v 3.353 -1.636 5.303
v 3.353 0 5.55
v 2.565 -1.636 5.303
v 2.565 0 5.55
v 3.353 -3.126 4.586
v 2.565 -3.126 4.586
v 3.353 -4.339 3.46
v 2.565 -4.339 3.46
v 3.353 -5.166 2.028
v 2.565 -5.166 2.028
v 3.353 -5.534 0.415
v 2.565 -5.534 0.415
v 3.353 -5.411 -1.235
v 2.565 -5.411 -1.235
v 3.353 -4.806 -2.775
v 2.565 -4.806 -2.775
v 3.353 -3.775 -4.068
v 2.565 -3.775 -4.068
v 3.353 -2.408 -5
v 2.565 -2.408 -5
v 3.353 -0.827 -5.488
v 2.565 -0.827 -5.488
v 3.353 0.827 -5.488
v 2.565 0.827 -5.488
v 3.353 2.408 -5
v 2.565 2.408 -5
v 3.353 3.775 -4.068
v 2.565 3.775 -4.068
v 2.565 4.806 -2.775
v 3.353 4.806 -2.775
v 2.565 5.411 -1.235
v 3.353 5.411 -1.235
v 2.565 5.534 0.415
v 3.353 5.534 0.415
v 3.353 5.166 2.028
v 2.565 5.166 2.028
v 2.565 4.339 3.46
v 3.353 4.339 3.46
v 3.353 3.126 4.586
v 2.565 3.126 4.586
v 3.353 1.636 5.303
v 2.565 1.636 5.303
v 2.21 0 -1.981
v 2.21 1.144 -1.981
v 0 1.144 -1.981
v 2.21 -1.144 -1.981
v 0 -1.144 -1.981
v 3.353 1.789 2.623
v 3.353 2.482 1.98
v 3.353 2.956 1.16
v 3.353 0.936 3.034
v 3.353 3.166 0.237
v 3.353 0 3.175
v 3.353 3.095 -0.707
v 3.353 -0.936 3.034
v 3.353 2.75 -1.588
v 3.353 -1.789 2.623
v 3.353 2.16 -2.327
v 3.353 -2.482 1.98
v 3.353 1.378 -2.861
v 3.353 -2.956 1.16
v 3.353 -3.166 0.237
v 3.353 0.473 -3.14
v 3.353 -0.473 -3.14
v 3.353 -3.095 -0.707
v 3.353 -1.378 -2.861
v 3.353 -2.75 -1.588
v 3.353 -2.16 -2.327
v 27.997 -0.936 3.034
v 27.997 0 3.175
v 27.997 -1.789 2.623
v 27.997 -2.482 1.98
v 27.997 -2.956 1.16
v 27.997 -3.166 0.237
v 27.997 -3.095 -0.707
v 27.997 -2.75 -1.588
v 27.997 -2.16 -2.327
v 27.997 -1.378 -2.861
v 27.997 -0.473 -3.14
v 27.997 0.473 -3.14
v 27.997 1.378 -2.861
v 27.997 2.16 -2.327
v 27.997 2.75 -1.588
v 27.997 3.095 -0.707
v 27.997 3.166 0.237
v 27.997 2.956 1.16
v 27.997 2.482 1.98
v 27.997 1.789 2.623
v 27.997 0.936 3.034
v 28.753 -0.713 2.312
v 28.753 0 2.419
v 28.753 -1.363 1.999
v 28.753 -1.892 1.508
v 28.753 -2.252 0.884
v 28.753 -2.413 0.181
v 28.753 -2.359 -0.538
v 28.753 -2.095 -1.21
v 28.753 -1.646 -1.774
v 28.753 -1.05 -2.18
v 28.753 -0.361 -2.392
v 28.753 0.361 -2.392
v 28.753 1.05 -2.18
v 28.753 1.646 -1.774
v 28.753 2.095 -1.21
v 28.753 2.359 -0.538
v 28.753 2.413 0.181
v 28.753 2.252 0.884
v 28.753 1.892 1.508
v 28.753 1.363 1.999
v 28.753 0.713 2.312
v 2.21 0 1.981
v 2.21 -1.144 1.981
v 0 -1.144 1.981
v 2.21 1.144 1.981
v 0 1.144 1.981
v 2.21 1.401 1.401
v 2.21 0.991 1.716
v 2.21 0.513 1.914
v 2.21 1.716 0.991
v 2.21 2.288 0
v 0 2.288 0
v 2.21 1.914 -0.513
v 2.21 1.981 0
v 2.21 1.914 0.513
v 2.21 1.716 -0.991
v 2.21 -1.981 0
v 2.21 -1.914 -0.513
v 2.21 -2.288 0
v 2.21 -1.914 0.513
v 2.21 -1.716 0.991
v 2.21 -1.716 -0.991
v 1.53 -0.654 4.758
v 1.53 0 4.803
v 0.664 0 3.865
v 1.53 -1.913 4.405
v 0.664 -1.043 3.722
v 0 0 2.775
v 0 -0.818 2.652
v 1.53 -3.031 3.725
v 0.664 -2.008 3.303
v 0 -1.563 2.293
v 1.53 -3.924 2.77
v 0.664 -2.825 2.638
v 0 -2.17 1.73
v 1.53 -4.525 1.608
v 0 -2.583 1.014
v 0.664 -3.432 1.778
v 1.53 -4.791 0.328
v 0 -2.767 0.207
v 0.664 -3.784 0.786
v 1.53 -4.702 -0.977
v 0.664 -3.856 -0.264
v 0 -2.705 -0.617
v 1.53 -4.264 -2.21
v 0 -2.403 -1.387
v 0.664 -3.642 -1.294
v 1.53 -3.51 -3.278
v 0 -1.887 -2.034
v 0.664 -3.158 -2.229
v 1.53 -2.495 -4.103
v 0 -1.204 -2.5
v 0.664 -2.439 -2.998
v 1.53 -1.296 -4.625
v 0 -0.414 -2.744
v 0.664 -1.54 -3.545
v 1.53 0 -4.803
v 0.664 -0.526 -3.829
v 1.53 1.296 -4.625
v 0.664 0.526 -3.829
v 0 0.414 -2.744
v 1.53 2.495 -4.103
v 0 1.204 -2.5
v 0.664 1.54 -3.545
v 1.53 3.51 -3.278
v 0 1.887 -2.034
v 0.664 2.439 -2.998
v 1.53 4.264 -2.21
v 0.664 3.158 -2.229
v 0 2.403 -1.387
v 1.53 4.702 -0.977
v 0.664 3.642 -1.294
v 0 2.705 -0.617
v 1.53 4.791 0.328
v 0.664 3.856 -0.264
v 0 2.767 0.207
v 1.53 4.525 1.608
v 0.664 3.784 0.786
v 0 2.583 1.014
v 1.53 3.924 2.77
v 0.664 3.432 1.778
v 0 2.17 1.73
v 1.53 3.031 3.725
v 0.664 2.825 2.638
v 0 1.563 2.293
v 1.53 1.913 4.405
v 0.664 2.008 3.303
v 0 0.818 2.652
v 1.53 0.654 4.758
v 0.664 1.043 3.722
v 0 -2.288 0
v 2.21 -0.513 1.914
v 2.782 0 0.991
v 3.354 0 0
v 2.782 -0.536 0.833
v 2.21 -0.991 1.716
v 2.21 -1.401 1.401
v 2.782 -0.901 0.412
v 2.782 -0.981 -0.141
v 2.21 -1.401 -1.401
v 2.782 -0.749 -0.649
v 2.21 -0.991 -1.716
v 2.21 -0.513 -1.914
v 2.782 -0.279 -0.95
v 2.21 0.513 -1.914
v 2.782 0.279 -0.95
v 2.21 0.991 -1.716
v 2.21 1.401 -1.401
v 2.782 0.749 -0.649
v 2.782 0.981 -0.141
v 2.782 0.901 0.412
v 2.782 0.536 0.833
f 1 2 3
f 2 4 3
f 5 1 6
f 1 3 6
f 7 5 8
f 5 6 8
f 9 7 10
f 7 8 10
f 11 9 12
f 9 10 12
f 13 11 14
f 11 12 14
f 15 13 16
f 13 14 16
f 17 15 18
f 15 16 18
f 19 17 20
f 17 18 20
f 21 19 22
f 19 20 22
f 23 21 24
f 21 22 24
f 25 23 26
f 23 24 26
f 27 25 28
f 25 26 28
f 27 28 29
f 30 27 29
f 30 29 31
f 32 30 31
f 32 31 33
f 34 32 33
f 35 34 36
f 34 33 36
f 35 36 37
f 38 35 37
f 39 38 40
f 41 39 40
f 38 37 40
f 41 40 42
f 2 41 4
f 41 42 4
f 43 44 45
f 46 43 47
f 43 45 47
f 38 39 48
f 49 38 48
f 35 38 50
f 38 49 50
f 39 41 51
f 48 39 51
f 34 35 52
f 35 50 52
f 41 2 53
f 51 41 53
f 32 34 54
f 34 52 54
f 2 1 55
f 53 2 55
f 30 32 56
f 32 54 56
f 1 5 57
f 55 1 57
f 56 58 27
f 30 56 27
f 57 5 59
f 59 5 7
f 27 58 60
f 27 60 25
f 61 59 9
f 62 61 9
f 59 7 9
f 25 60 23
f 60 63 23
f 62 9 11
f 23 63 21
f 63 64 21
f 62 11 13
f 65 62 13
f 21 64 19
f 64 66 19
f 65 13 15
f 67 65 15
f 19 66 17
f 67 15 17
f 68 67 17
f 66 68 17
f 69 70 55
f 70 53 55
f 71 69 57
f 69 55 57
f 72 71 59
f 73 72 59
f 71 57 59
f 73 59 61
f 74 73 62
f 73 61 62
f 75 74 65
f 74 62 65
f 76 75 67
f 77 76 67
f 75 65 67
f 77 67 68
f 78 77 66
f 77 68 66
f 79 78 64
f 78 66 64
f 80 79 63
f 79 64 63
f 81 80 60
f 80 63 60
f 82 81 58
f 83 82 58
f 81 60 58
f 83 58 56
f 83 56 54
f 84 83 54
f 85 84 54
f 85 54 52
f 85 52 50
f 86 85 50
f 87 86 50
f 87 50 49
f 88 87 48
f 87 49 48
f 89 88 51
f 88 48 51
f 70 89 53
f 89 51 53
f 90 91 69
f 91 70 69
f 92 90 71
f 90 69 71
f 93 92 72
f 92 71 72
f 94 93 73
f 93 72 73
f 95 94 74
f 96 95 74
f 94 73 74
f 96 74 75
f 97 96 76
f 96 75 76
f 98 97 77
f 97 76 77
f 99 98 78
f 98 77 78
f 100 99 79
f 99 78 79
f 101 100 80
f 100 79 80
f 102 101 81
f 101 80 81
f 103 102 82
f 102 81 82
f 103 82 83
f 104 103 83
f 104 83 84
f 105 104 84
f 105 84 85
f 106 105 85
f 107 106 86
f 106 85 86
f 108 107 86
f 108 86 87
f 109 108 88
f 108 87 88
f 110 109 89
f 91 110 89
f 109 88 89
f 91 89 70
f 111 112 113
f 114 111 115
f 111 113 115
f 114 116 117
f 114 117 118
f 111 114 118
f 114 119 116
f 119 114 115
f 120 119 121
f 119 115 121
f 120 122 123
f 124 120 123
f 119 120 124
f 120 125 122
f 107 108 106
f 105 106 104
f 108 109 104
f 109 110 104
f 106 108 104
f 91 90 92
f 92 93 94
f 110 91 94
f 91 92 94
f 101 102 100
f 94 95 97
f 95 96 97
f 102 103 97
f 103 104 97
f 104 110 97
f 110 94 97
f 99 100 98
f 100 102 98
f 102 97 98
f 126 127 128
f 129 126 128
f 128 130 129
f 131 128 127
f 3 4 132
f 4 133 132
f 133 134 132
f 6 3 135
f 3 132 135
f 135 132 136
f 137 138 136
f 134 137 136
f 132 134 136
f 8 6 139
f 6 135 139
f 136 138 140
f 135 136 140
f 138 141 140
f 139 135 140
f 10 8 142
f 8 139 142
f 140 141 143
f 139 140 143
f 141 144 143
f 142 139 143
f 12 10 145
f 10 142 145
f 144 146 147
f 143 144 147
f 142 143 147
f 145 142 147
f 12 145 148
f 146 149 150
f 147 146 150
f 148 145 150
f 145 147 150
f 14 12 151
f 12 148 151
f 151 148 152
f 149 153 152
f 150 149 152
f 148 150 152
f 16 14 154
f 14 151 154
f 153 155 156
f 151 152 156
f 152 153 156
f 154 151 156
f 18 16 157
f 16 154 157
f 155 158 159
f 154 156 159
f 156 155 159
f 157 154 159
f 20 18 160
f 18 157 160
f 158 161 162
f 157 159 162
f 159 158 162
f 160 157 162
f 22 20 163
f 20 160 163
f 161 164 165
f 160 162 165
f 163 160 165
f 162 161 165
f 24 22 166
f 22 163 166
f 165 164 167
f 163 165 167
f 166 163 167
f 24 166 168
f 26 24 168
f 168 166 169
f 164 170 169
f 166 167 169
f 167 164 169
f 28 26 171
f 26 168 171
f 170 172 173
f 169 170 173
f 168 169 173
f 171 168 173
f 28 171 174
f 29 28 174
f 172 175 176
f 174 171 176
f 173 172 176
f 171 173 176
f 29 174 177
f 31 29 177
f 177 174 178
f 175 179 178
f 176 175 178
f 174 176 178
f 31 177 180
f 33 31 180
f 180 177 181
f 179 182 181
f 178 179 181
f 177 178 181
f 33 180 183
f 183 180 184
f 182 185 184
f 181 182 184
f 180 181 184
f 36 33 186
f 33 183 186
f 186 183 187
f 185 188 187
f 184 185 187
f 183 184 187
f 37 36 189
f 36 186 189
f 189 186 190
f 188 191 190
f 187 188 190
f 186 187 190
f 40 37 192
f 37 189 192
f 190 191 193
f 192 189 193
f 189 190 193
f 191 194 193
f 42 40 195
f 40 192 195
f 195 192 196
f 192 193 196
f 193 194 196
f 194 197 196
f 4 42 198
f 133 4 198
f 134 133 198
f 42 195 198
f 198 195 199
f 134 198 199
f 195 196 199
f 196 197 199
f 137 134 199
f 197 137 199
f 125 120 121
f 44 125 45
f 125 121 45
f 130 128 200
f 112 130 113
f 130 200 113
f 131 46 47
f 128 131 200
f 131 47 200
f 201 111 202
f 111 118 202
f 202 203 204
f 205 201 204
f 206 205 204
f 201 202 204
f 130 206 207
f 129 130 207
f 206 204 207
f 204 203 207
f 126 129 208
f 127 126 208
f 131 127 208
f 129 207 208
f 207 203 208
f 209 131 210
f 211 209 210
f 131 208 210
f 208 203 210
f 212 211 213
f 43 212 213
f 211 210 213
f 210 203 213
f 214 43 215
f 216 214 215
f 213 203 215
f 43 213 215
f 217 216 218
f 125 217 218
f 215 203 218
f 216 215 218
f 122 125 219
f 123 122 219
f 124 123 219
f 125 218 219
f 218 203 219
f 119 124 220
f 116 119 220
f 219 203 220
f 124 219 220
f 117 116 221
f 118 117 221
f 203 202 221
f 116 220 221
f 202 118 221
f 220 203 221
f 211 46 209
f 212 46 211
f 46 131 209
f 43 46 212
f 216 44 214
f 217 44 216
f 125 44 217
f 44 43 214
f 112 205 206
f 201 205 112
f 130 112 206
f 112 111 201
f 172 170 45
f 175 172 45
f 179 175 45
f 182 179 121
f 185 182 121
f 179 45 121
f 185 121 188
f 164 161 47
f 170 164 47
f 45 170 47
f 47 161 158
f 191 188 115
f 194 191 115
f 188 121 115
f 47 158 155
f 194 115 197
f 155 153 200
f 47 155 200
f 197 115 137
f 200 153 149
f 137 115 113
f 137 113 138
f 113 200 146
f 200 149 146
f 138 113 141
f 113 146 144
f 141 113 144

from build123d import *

# Parameters (mm, degrees)
HEX_2_DEPTH = 2.2098


with BuildPart() as part:
    # BodySke → BaseBody (revolve)
    with BuildSketch(Plane.XY, mode=Mode.PRIVATE) as basebody_sk:
        with BuildLine():
            Line((28.7528, 0), (28.7528, 2.41935))
            Line((28.7528, 2.41935), (27.99715, 3.175))
            Line((27.99715, 3.175), (3.3528, 3.175))
            Line((3.3528, 3.175), (3.3528, 5.5499))
            Line((3.3528, 5.5499), (2.5654, 5.5499))
            ThreePointArc((2.5654, 5.5499), (1.073764503, 4.355582759), (0, 2.77495))
            Line((0, 2.77495), (0, 0))
            Line((0, 0), (28.7528, 0))
        make_face()
    revolve(basebody_sk.sketch.rotate(Axis((0, 0, 0), (1, 0, 0)), 90), axis=Axis((0, 0, 0), (1, 0, 0)))

    # Sketch2 → PreBroach (revolve, cut)
    with BuildSketch(Plane.XY, mode=Mode.PRIVATE) as prebroach_sk:
        Polygon((0, 1.9812), (2.2098, 1.9812), (3.353646353, 0), (0, 0), align=None)
    revolve(prebroach_sk.sketch.rotate(Axis((0, 0, 0), (1, 0, 0)), 90), axis=Axis((0, 0, 0), (1, 0, 0)), mode=Mode.SUBTRACT)

    # Sketch3 → Hex 2 (cut)
    with BuildSketch(Plane(origin=(0, 0, 0), x_dir=(0, 0, -1), z_dir=(1, 0, 0))):
        Polygon((-1.9812, -1.143846353), (-1.9812, 1.143846353), (0, 2.287692707), (1.9812, 1.143846353), (1.9812, -1.143846353), (0, -2.287692707), align=None)
    extrude(amount=HEX_2_DEPTH, mode=Mode.SUBTRACT)


solid = part.part
